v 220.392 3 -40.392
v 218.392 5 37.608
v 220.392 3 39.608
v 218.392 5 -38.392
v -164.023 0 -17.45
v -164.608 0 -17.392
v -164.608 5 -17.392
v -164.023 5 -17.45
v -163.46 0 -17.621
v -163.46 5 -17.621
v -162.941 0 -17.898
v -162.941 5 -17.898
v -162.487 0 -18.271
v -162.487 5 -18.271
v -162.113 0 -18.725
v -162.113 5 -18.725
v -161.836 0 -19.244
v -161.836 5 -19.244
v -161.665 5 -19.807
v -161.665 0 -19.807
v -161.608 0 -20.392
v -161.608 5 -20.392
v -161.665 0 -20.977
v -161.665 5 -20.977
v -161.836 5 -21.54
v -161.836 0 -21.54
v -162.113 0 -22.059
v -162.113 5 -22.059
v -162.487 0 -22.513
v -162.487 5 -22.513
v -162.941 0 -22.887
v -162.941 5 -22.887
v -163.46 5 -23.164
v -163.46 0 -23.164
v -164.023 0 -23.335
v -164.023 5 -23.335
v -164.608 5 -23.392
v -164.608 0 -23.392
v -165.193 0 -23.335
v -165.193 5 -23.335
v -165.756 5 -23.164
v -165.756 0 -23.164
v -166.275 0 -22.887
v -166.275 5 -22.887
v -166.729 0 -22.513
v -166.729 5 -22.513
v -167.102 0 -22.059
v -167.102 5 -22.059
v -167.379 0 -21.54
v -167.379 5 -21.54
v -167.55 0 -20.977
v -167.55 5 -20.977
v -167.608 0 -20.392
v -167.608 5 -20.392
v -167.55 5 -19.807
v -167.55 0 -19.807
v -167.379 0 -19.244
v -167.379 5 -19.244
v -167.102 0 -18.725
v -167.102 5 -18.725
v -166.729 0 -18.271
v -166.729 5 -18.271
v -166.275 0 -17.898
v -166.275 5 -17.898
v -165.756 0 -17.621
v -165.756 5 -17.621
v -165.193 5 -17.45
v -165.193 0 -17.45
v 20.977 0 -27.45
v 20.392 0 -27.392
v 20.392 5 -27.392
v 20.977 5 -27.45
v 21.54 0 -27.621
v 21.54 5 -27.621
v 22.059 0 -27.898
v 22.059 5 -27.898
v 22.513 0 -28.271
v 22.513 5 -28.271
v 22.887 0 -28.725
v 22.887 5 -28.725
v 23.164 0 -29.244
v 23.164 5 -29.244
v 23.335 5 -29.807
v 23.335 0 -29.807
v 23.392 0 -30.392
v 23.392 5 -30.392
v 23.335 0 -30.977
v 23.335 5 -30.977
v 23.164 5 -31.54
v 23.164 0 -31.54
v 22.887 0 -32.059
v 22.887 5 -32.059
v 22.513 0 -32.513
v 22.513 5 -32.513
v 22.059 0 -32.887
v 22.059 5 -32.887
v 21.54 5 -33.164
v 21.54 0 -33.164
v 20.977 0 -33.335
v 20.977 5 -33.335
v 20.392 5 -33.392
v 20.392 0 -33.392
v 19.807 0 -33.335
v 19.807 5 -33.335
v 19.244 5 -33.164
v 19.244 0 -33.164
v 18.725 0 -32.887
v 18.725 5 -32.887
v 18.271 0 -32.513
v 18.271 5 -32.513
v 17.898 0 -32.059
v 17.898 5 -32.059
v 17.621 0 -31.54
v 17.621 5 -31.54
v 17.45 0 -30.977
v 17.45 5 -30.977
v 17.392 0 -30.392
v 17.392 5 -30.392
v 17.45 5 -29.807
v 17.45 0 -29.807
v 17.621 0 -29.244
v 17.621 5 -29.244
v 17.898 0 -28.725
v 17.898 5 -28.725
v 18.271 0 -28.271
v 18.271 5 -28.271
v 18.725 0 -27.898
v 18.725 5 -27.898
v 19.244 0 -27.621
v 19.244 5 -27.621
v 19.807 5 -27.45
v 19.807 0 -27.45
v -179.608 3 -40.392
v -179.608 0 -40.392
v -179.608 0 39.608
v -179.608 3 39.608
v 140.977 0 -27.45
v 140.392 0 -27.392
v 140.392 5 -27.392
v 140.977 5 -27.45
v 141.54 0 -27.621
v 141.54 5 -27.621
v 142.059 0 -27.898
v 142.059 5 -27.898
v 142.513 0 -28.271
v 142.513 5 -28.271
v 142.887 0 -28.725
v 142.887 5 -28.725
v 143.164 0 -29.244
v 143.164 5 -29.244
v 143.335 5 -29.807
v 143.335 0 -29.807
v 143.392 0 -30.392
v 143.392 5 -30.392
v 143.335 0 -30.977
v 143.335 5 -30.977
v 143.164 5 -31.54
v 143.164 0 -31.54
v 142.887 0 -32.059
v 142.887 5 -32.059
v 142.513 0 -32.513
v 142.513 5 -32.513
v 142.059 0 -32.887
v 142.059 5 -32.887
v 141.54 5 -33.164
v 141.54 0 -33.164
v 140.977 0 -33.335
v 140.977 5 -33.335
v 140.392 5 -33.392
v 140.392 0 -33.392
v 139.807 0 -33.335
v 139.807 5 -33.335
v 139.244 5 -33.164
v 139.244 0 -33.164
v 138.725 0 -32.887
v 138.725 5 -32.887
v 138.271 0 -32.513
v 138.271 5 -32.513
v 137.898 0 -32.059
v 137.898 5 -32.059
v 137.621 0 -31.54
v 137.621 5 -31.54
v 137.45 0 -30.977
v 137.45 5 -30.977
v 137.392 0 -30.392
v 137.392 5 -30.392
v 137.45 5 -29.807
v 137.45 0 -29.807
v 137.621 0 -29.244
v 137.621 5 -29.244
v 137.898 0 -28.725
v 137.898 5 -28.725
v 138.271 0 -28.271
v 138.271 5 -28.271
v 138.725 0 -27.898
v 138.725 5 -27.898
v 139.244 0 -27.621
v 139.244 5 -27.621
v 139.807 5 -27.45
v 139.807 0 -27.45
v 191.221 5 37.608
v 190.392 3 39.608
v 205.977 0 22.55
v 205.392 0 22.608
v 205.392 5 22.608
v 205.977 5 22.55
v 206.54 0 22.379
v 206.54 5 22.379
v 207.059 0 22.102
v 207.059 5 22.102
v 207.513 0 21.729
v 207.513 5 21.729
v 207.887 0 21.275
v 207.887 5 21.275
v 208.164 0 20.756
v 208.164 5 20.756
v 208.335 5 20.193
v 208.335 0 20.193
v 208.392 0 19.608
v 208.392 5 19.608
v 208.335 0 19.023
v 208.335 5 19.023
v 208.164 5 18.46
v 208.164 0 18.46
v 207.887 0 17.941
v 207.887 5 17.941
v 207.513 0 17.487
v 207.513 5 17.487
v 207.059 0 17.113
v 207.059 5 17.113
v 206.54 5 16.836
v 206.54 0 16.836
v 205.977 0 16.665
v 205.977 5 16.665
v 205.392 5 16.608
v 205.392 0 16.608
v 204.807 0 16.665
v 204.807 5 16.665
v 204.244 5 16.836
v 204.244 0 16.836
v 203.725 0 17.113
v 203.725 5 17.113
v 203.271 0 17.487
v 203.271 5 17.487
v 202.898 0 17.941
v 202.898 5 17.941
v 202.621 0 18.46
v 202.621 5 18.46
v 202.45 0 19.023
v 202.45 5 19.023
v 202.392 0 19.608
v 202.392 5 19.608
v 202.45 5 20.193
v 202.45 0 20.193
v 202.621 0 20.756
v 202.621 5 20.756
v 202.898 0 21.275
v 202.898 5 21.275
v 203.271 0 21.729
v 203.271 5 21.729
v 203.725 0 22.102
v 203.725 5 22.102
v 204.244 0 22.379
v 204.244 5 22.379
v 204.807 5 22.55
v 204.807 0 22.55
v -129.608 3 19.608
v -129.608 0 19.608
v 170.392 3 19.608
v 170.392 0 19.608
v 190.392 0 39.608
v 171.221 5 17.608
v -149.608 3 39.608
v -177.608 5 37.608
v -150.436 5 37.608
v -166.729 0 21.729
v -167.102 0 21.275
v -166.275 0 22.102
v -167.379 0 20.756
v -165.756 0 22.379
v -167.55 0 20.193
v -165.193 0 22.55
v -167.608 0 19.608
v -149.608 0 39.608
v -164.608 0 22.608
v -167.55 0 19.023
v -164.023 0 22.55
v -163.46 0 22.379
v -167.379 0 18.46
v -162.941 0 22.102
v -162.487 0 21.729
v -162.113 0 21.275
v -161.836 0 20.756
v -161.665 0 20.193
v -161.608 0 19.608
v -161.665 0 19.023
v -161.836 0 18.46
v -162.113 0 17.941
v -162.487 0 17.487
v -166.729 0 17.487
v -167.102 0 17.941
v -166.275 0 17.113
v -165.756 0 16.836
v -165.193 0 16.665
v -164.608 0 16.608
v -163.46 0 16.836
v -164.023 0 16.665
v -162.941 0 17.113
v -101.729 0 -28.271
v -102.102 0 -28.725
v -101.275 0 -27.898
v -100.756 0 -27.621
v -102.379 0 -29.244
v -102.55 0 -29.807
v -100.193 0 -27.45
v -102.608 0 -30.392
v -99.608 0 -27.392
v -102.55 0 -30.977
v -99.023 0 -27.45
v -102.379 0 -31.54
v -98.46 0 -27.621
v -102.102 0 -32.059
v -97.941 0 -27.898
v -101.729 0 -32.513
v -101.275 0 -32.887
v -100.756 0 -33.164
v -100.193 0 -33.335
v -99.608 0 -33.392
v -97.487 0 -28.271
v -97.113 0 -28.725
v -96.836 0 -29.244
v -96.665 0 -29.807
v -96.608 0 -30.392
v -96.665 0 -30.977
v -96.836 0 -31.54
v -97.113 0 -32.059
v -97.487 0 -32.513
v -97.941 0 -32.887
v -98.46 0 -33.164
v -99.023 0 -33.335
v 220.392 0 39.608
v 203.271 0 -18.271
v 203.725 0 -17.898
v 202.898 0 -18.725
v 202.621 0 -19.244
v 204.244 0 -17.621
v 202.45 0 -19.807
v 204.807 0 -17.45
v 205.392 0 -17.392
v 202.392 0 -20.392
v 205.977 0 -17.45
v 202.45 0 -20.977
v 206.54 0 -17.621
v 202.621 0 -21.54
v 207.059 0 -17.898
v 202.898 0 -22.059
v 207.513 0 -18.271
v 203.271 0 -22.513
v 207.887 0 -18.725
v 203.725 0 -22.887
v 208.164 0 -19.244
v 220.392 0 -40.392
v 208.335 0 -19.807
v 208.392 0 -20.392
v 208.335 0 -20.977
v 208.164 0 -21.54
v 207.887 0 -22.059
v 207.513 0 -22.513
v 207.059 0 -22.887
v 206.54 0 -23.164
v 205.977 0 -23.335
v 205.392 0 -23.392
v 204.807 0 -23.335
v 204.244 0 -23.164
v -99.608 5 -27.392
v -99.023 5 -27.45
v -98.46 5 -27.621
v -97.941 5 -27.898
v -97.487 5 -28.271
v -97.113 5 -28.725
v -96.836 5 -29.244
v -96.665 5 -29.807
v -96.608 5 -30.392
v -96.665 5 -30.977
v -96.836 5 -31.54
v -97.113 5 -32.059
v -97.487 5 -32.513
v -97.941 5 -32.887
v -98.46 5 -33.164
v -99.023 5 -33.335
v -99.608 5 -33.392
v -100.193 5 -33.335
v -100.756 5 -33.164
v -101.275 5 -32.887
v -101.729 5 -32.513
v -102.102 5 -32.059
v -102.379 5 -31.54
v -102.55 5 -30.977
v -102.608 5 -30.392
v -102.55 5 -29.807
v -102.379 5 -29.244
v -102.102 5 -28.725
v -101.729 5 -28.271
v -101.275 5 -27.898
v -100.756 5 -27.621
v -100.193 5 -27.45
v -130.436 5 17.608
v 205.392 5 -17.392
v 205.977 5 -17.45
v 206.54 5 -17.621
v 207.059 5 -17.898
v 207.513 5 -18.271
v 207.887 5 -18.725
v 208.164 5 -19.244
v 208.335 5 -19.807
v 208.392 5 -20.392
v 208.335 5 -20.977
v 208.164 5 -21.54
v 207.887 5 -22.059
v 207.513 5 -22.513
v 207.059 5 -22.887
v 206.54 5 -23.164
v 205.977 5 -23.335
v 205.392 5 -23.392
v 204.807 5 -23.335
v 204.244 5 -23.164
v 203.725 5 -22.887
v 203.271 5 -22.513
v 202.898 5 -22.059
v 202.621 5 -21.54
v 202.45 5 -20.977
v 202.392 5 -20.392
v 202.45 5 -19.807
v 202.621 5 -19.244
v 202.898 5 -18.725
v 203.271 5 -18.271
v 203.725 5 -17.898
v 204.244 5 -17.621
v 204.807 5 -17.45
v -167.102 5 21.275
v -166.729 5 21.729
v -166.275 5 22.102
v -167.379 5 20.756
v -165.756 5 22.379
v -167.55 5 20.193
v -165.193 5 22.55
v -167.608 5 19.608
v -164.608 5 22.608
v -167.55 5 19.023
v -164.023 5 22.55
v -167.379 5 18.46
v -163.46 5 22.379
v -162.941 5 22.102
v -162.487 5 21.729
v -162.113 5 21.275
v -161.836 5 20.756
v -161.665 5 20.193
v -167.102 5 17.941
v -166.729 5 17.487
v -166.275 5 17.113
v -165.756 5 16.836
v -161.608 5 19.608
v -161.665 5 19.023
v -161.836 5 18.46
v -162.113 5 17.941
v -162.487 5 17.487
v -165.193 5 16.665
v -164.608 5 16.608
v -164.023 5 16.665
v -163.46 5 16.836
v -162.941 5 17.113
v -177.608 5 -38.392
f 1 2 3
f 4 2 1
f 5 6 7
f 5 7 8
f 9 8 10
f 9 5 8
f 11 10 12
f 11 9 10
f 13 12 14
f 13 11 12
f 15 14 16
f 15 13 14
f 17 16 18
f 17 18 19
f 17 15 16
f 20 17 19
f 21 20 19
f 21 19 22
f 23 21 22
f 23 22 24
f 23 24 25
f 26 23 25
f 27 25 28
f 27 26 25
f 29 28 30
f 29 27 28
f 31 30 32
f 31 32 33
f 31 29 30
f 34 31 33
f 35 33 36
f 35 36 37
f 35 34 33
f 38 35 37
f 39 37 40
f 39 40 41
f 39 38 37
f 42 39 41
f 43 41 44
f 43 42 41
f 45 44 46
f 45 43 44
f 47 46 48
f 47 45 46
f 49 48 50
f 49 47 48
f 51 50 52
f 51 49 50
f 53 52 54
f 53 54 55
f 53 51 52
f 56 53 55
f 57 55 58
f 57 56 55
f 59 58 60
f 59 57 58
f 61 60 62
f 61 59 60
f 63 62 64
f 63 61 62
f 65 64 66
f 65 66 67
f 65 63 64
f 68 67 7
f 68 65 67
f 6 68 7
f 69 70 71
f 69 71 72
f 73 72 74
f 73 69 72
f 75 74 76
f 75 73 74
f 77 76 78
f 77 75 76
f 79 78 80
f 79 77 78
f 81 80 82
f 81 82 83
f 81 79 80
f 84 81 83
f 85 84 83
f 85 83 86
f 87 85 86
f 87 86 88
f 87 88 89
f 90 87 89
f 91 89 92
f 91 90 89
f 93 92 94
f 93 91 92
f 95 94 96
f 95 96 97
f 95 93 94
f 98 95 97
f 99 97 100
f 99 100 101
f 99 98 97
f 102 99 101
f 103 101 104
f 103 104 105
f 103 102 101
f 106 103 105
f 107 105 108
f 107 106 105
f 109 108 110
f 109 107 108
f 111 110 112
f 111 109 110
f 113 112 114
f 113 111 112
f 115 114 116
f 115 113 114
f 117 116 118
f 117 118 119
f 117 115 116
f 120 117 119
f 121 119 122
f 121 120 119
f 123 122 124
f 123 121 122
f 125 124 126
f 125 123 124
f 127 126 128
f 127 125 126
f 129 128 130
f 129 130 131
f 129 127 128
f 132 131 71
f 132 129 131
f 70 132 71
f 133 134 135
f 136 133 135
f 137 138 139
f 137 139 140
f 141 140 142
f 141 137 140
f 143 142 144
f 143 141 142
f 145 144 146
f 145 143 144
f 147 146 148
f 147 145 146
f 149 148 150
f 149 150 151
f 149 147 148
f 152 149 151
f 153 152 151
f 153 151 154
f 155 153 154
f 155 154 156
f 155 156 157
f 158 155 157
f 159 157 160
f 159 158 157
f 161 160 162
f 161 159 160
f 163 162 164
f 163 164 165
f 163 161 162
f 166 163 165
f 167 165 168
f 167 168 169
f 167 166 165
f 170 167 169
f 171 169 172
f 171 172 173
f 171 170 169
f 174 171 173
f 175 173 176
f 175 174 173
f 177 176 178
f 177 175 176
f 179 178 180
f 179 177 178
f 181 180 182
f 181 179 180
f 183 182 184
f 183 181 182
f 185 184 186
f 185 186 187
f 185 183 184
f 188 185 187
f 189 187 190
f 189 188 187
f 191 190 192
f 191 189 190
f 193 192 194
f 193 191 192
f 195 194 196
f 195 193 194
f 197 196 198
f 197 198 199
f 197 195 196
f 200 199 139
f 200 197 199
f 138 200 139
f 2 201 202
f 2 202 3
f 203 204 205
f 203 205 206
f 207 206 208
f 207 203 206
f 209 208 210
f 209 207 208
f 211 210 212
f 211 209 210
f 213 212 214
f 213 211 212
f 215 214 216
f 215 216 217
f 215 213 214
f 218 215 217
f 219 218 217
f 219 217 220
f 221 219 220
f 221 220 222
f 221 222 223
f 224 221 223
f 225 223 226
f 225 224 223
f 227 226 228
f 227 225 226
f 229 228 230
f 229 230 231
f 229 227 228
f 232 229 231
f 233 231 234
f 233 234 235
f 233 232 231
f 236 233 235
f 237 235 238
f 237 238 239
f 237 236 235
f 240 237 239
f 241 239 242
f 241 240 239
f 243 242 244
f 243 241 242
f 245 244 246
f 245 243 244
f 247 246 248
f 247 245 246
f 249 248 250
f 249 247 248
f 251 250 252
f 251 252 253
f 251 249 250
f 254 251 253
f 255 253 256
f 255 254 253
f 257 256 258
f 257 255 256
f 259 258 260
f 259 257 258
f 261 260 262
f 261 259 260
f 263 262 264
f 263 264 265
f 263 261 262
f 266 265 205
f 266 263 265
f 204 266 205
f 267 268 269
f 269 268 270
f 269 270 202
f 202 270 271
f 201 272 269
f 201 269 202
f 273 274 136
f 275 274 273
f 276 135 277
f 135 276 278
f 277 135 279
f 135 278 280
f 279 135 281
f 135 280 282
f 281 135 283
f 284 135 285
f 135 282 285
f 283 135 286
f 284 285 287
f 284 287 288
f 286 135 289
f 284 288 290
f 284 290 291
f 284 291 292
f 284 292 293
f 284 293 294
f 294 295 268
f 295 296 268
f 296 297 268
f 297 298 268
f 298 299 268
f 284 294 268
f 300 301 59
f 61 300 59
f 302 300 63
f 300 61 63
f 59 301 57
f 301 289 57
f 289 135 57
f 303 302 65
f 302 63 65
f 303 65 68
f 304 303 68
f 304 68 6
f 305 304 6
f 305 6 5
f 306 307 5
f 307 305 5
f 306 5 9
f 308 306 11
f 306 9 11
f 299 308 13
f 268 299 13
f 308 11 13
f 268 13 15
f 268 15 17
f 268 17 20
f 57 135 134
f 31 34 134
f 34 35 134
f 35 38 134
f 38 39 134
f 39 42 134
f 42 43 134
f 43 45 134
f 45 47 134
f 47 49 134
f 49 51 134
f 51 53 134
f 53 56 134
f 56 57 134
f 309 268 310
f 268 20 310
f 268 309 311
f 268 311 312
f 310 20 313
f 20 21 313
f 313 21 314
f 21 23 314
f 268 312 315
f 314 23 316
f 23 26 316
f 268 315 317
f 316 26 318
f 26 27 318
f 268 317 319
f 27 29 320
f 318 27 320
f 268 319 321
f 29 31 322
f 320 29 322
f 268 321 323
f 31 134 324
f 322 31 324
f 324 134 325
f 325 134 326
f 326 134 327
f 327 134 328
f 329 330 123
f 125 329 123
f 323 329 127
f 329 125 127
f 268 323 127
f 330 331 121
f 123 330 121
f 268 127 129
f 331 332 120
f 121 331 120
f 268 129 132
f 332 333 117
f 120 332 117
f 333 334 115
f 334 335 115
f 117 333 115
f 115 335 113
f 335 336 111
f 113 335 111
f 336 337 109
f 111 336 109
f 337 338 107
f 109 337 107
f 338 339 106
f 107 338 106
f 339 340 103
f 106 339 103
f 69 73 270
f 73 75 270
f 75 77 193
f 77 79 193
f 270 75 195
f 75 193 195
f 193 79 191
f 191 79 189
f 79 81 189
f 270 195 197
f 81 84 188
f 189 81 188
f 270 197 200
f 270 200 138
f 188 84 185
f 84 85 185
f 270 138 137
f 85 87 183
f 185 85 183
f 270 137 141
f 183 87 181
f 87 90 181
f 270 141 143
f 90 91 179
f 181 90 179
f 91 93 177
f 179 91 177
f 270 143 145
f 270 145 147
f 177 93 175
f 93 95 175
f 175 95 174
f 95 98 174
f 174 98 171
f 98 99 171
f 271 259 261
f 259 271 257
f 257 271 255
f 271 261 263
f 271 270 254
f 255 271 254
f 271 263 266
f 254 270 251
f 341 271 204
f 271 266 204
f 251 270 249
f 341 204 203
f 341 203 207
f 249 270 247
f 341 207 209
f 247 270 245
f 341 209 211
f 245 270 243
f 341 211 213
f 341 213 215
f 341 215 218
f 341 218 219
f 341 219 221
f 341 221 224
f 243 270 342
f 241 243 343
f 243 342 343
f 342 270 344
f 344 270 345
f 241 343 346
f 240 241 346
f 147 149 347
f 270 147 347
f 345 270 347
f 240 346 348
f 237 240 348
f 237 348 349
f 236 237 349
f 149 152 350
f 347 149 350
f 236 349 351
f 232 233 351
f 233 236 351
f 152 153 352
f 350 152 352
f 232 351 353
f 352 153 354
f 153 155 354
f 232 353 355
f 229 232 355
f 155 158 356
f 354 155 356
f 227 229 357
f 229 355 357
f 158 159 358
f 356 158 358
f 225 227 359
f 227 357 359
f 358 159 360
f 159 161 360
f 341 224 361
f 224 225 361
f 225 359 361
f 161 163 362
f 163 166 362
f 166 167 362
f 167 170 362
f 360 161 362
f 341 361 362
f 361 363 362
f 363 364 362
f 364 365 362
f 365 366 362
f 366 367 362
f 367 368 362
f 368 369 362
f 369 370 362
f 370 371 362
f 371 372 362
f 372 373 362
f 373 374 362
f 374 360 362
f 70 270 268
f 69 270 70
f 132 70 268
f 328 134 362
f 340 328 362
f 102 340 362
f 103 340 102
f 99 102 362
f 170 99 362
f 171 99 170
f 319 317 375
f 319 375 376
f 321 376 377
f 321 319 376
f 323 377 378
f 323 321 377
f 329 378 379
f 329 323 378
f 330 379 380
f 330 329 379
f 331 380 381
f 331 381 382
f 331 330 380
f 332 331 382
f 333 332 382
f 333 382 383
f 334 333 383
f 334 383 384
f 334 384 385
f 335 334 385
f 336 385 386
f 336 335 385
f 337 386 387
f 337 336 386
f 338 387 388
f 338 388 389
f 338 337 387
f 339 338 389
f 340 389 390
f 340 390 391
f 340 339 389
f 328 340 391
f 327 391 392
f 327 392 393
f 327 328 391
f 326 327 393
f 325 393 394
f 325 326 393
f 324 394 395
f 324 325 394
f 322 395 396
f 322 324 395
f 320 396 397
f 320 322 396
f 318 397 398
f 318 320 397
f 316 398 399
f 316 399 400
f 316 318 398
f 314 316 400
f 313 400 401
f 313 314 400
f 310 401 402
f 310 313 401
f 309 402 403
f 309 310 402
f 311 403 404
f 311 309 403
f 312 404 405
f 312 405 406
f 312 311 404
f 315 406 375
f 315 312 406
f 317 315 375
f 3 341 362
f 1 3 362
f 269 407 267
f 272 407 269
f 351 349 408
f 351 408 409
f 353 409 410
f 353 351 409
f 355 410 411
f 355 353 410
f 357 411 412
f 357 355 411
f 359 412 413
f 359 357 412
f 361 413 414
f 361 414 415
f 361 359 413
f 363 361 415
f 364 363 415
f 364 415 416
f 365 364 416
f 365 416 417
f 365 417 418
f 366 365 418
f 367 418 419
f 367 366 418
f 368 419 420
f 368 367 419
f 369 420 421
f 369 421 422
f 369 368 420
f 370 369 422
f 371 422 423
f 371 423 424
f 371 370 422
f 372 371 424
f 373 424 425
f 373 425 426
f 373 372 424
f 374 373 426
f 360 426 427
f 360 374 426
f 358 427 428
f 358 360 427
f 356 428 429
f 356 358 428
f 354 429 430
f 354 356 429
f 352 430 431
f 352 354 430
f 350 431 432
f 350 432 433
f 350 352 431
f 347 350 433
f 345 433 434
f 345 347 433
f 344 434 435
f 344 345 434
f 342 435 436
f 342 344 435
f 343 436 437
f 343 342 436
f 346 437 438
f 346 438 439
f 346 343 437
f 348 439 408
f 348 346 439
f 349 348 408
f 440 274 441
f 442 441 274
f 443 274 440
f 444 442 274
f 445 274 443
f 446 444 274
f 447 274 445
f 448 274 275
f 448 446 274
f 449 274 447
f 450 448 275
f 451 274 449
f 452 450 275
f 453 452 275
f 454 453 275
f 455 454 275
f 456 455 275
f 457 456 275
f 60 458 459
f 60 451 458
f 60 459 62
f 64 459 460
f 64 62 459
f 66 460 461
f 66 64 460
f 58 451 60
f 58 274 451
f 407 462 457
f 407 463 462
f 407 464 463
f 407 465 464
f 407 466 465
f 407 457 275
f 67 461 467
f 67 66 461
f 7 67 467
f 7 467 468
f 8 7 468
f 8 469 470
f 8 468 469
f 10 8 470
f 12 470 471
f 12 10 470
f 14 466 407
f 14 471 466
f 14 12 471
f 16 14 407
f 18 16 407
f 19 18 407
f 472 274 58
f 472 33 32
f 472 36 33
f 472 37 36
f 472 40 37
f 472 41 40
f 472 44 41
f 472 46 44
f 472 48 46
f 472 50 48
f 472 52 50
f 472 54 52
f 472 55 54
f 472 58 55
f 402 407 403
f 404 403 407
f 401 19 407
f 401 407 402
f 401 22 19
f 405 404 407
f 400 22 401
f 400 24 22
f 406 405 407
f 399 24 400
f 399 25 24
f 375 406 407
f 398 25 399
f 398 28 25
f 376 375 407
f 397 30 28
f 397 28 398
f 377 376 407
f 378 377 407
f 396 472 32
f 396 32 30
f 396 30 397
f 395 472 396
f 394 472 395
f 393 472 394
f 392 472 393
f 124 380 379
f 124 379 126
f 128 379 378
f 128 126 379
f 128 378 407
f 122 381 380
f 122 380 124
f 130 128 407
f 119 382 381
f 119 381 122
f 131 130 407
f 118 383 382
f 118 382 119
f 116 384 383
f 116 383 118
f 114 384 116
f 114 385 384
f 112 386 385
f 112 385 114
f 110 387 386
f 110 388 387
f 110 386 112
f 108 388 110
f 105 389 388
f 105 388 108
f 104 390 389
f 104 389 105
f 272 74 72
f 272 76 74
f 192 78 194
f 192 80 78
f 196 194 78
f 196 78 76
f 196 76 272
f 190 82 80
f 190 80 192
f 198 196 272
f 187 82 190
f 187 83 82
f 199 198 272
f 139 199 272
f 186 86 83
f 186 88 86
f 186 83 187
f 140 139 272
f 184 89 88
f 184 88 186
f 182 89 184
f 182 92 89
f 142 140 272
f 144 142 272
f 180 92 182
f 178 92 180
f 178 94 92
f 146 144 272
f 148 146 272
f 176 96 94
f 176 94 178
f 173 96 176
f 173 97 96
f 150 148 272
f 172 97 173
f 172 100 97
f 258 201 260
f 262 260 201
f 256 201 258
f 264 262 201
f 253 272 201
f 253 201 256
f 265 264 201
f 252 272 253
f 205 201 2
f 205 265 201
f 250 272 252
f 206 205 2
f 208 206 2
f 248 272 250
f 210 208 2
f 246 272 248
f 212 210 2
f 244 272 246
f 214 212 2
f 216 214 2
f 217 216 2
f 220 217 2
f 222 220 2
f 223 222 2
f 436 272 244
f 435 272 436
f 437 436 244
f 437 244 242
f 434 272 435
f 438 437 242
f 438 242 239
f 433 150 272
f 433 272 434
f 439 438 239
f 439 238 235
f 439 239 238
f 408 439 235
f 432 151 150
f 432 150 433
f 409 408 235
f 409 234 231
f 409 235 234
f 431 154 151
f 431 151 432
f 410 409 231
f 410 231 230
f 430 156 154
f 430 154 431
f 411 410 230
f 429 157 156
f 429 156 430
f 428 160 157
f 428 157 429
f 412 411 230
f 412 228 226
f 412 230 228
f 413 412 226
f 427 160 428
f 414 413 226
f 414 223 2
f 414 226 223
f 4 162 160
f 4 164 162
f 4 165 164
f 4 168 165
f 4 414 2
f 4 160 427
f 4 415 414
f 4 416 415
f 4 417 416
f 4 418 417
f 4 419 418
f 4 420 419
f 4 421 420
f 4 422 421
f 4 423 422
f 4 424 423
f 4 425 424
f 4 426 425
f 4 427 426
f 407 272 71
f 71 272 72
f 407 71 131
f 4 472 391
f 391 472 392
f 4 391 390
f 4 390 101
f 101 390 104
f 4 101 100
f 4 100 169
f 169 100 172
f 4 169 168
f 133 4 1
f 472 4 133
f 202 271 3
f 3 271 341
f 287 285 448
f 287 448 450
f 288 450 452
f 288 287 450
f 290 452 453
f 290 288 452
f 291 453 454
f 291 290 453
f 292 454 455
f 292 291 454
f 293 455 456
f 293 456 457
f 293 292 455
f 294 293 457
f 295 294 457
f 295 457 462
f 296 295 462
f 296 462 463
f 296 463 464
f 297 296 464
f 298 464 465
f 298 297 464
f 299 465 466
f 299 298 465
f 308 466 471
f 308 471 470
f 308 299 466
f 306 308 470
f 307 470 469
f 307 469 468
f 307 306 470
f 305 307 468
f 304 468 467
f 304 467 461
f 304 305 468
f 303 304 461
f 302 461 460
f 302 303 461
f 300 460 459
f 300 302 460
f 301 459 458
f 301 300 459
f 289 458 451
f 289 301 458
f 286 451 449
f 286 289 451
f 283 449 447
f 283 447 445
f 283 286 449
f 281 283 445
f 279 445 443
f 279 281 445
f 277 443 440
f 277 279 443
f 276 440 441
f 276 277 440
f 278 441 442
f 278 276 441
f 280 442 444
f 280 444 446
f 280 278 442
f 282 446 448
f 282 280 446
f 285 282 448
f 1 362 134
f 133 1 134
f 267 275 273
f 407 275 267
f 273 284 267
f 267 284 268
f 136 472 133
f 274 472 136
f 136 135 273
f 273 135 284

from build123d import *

# Parameters (mm, degrees)
CROQUIS1_R              = 3
SALIENTE_EXTRUIR1_DEPTH = 5
CHAFL_N1_SIZE           = 2


with BuildPart() as part:
    # Croquis1 → Saliente-Extruir1 (new body)
    with BuildSketch(Plane(origin=(0, 0, 0), x_dir=(1, 0, 0), z_dir=(0, 1, 0))):
        Polygon((-149.607843137, -39.607843137), (-129.607843137, -19.607843137), (170.392156863, -19.607843137), (190.392156863, -39.607843137), (220.392156863, -39.607843137), (220.392156863, 40.392156863), (-179.607843137, 40.392156863), (-179.607843137, -39.607843137), align=None)
        with Locations(Location((-164.607843137, 20.392156863, 0), (0, 0, 270))):
            Circle(CROQUIS1_R, mode=Mode.SUBTRACT)
        with Locations(Location((-99.607843137, 30.392156863, 0), (0, 0, 270))):
            Circle(CROQUIS1_R, mode=Mode.SUBTRACT)
        with Locations(Location((140.392156863, 30.392156863, 0), (0, 0, 270))):
            Circle(CROQUIS1_R, mode=Mode.SUBTRACT)
        with Locations(Location((20.392156863, 30.392156863, 0), (0, 0, 270))):
            Circle(CROQUIS1_R, mode=Mode.SUBTRACT)
        with Locations(Location((-164.607843137, -19.607843137, 0), (0, 0, 270))):
            Circle(CROQUIS1_R, mode=Mode.SUBTRACT)
        with Locations(Location((205.392156863, 20.392156863, 0), (0, 0, 270))):
            Circle(CROQUIS1_R, mode=Mode.SUBTRACT)
        with Locations(Location((205.392156863, -19.607843137, 0), (0, 0, 270))):
            Circle(CROQUIS1_R, mode=Mode.SUBTRACT)
    extrude(amount=SALIENTE_EXTRUIR1_DEPTH)

    # Chaflán1
    chafl_n1_edges = [part.edges().sort_by_distance(p)[0] for p in [
        (-139.607843137, 5, 29.607843137),
        (20.392156863, 5, 19.607843137),
        (180.392156863, 5, 29.607843137),
        (205.392156863, 5, 39.607843137),
        (220.392156863, 5, -0.392156863),
        (20.392156863, 5, -40.392156863),
        (-179.607843137, 5, -0.392156863),
        (-164.607843137, 5, 39.607843137),
    ]]
    chamfer(chafl_n1_edges, length=CHAFL_N1_SIZE)


solid = part.part
